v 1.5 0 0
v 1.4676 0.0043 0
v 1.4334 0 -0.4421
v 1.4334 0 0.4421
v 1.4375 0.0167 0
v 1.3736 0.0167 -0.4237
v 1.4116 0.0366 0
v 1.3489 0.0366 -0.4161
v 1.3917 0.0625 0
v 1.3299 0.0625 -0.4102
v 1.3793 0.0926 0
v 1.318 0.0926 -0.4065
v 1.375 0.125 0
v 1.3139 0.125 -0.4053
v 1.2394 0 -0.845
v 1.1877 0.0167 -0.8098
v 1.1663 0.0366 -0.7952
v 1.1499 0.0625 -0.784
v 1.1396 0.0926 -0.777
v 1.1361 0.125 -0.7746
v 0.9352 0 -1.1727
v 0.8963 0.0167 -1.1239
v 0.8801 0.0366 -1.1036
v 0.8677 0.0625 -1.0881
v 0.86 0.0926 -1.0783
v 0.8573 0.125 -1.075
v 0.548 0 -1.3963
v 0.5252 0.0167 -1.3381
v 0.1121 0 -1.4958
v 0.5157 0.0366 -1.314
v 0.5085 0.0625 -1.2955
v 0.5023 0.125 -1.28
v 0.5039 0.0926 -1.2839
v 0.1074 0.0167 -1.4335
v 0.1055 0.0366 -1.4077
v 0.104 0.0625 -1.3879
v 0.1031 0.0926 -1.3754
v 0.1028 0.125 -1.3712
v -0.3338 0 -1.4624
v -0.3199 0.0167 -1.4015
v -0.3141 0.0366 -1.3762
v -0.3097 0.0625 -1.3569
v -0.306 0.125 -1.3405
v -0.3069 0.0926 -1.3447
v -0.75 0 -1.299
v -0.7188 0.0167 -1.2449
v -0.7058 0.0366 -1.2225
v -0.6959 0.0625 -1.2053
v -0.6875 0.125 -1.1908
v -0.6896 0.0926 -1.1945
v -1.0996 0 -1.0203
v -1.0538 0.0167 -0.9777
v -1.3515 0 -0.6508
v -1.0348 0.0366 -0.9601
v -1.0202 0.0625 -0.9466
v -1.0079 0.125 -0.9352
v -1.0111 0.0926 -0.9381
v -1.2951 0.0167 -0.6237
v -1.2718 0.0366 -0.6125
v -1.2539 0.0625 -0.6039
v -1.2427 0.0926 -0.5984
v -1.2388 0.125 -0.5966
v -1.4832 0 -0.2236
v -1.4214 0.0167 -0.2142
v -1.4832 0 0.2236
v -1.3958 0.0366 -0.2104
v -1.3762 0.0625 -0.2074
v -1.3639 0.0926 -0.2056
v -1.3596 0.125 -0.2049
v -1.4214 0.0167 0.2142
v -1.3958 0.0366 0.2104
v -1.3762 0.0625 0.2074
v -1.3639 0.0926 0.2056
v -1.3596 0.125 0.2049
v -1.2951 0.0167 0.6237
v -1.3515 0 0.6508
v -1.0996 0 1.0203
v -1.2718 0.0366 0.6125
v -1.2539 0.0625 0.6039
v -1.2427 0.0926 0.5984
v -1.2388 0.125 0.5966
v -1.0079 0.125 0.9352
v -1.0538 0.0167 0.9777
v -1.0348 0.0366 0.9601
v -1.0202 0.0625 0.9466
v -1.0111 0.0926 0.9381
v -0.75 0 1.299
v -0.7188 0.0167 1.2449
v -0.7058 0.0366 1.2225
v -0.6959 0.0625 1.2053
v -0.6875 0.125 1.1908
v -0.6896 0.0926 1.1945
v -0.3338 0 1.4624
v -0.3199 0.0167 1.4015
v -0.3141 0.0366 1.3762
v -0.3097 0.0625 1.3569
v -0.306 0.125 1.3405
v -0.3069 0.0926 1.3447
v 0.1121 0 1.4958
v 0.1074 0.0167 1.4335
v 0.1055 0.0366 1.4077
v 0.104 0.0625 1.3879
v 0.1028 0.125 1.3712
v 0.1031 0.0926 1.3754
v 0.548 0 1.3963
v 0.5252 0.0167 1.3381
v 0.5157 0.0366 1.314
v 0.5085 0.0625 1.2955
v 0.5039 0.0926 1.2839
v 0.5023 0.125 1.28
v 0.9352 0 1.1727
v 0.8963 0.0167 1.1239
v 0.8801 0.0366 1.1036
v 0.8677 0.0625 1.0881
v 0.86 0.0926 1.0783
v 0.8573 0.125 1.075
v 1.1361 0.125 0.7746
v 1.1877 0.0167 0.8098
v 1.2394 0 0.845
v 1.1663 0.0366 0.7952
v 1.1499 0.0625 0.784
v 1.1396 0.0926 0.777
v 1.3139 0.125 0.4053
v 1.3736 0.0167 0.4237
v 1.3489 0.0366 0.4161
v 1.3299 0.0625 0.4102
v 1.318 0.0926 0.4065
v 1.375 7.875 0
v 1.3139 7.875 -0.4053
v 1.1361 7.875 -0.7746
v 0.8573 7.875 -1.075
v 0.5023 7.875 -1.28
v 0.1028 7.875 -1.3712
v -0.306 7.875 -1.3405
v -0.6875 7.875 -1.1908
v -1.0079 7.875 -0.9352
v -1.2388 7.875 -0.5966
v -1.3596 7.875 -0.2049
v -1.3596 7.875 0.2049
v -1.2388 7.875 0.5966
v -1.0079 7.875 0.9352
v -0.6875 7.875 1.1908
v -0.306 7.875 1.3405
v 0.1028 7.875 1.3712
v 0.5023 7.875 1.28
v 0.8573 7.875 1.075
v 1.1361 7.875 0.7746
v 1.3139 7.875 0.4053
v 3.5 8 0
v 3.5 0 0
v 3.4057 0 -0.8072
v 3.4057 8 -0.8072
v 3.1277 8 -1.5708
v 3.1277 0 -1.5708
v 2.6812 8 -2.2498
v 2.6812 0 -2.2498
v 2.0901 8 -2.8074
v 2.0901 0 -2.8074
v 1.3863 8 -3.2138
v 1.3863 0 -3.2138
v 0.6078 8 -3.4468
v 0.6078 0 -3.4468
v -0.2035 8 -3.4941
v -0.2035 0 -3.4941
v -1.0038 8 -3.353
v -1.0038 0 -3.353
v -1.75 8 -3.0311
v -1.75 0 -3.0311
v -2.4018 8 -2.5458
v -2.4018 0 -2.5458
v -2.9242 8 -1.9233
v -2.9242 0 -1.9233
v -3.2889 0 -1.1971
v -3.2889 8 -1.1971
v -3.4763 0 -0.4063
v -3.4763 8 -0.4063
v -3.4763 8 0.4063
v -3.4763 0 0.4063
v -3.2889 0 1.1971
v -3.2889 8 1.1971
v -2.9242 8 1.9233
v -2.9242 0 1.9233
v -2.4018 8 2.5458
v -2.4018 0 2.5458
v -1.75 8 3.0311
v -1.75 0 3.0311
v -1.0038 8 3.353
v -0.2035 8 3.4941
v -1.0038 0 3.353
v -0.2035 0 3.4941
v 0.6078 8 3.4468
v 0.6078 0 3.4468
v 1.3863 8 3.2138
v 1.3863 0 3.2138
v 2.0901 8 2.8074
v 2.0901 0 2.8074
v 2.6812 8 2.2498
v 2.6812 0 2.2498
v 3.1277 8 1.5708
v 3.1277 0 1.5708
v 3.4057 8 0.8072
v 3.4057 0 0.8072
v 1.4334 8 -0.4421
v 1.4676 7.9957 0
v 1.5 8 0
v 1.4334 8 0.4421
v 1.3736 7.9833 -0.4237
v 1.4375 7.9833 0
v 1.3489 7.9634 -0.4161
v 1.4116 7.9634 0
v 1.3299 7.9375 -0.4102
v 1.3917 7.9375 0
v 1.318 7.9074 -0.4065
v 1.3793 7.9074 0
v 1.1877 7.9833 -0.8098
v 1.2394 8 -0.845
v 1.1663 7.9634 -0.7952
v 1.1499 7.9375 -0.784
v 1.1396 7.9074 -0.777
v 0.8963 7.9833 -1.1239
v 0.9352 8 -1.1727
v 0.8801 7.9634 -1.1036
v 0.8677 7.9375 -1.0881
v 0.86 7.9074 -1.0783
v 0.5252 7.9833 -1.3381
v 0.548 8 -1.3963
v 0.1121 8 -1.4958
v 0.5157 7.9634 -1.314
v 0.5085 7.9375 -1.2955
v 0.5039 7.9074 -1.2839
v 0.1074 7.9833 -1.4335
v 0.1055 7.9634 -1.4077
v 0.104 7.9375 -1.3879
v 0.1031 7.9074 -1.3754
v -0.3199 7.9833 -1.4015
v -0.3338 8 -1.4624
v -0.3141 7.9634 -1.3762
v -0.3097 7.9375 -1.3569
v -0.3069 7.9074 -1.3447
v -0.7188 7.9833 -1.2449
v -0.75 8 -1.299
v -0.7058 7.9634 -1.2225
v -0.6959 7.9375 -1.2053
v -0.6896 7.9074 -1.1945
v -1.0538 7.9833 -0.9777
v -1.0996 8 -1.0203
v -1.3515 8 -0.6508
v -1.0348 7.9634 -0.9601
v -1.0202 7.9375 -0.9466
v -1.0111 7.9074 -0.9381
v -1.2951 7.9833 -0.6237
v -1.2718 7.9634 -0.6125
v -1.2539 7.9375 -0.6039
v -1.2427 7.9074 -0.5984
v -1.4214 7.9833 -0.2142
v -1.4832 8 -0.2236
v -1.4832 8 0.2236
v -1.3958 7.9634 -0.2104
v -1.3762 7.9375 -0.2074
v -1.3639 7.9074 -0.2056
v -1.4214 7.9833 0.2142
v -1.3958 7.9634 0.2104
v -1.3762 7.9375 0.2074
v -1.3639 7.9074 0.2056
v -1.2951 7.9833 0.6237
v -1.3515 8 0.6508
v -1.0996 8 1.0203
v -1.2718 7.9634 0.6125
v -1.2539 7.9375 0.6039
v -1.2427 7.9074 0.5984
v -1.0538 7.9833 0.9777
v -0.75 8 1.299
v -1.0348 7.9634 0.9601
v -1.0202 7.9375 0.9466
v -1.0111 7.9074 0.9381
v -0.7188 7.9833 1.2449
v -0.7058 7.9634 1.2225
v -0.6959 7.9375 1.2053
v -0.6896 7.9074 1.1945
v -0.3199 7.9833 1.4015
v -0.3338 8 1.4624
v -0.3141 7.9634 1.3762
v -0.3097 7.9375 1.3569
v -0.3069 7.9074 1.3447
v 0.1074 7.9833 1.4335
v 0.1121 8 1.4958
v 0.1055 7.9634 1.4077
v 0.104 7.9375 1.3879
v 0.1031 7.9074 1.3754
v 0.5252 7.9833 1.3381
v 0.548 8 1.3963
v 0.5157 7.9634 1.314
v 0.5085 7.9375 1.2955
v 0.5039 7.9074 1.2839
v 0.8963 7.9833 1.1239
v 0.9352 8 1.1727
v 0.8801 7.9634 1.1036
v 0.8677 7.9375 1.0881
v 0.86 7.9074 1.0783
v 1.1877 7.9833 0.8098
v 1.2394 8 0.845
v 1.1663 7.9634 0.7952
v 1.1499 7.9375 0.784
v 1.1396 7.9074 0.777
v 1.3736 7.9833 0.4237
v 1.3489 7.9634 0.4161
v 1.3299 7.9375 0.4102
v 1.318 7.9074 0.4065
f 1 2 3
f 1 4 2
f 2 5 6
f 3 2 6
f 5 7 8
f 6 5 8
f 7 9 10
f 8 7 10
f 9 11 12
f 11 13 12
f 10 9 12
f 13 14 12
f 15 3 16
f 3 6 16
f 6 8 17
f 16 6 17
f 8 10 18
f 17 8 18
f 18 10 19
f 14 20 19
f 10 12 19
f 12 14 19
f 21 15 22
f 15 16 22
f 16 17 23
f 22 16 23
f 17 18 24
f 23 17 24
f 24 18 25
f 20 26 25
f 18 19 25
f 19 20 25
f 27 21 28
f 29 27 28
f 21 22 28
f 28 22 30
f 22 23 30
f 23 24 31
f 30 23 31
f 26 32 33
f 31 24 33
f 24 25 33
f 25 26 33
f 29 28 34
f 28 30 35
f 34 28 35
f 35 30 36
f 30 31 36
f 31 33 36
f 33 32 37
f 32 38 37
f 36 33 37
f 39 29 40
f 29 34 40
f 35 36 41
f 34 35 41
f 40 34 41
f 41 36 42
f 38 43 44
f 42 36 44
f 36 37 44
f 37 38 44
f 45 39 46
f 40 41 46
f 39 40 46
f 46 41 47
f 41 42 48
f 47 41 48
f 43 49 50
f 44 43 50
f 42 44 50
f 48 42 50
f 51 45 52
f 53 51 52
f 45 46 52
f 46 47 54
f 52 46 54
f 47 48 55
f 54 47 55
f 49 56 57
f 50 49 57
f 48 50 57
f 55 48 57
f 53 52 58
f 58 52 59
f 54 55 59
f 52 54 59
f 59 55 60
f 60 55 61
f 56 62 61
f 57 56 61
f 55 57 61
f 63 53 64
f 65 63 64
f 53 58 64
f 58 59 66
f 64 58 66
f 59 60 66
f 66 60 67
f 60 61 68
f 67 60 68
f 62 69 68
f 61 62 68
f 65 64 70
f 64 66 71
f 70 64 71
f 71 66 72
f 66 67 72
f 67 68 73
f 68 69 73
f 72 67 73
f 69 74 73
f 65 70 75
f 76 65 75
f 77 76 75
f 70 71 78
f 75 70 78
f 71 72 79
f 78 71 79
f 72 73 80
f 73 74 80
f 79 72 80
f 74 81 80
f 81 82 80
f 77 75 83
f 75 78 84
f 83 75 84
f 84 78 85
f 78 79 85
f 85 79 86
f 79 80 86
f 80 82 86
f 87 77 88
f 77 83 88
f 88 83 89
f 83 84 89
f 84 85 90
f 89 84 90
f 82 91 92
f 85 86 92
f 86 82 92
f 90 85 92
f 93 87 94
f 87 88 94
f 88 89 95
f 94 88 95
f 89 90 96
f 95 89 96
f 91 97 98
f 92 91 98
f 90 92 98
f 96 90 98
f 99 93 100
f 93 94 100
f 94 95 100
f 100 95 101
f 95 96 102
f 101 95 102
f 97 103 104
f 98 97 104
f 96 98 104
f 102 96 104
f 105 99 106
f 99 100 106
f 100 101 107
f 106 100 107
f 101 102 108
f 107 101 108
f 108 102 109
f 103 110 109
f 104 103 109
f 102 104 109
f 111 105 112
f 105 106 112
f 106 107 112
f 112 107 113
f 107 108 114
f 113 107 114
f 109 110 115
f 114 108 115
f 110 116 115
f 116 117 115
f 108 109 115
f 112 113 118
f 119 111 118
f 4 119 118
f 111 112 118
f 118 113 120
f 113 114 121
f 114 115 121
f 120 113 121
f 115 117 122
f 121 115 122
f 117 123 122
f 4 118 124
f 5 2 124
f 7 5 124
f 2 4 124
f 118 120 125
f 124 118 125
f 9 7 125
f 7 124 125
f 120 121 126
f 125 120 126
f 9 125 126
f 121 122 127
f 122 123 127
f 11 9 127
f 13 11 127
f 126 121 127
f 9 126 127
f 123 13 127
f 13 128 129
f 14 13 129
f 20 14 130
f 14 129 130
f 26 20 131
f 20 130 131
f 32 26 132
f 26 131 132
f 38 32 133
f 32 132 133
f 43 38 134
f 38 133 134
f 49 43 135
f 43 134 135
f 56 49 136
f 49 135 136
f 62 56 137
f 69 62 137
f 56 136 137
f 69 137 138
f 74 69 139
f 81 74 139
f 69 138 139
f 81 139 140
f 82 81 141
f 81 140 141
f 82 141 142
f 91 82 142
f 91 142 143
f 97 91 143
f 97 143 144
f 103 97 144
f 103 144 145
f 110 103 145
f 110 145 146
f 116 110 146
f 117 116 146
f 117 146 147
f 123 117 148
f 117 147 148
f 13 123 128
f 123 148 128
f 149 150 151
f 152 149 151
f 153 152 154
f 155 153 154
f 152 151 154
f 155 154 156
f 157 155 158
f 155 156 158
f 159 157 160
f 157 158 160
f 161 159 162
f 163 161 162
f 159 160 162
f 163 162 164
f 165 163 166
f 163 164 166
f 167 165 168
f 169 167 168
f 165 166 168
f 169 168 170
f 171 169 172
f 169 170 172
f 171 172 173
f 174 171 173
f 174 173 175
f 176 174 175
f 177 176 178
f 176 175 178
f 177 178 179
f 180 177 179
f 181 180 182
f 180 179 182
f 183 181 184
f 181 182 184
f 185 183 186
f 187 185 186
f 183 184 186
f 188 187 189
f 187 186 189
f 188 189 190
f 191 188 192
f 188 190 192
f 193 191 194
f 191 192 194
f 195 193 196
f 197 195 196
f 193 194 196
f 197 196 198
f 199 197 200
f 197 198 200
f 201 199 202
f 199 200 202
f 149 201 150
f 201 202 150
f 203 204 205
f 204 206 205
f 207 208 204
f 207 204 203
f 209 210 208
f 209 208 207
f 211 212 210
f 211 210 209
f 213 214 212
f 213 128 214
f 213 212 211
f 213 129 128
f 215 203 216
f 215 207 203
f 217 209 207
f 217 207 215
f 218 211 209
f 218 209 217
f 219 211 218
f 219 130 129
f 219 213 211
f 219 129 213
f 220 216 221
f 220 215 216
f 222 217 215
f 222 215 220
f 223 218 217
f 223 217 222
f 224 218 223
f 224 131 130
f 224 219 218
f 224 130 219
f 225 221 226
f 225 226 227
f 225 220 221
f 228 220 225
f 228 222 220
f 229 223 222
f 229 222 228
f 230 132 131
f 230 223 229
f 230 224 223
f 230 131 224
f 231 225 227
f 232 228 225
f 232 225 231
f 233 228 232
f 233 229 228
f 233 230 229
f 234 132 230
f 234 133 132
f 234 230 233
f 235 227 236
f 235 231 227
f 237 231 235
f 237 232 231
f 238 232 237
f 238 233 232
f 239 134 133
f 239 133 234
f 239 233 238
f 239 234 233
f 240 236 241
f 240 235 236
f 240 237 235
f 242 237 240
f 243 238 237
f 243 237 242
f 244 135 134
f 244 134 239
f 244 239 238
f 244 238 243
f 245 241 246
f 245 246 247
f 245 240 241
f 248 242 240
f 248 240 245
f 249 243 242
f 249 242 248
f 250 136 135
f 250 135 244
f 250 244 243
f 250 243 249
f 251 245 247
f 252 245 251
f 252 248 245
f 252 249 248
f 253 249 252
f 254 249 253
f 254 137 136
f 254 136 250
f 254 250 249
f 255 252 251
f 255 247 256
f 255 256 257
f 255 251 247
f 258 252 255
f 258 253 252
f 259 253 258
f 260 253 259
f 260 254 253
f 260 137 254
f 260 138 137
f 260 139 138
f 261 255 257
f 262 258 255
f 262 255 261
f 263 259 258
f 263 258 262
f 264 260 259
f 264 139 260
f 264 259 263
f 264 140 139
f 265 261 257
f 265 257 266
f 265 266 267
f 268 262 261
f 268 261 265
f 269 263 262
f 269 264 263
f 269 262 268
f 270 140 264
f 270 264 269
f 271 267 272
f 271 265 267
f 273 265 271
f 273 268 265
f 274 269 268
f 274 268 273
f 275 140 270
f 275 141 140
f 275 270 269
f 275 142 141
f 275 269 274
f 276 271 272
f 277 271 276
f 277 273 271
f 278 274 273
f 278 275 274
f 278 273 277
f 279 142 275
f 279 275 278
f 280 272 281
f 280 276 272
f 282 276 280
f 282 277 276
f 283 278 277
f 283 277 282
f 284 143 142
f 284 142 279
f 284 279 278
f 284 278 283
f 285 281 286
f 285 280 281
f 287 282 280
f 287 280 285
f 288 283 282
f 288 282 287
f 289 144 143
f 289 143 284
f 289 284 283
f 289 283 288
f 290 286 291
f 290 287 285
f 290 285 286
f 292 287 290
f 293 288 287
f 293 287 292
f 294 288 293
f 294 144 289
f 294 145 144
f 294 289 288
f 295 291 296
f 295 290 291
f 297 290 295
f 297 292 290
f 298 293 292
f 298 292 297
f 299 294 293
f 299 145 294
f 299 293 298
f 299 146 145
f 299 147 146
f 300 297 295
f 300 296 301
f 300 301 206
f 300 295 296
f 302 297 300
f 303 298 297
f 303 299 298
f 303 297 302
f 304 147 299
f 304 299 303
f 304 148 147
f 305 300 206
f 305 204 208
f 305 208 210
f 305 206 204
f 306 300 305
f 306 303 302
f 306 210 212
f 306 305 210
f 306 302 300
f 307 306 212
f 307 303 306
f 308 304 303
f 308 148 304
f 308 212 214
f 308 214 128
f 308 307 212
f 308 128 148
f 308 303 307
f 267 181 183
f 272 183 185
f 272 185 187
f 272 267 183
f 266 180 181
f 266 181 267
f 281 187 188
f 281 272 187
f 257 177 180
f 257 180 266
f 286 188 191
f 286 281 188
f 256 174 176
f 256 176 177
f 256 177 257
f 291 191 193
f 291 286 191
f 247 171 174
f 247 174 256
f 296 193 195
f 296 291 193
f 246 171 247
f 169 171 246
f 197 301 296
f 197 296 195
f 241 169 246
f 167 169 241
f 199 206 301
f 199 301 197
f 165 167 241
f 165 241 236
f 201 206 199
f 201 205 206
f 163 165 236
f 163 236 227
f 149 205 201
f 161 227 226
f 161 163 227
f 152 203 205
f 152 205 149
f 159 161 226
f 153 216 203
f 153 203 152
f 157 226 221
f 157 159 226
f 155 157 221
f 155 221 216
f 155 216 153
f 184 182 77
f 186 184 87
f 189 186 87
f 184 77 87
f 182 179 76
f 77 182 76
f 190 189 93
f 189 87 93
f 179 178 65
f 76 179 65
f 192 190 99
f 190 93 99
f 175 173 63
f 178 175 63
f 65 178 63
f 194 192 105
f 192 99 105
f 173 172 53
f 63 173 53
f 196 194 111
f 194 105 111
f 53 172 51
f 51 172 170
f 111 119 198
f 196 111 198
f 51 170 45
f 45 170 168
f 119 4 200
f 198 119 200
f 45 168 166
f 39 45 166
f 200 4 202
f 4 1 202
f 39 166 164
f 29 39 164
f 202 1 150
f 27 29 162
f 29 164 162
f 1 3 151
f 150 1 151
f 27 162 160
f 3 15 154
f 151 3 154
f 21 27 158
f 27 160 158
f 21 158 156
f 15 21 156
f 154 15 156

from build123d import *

# Parameters (mm, degrees)
SKETCH1_R           = 3.5
BOSS_EXTRUDE1_DEPTH = 8
SKETCH2_R           = 1.375
CUT_EXTRUDE1_DEPTH  = 8
FILLET1_R           = 0.125


with BuildPart() as part:
    # Sketch1 → Boss-Extrude1 (new body)
    with BuildSketch(Plane(origin=(0, 0, 0), x_dir=(1, 0, 0), z_dir=(0, 1, 0))):
        Circle(SKETCH1_R)
    extrude(amount=BOSS_EXTRUDE1_DEPTH)

    # Sketch2 → Cut-Extrude1 (cut)
    with BuildSketch(Plane(origin=(0, 8, 0), x_dir=(1, 0, 0), z_dir=(0, 1, 0))):
        Circle(SKETCH2_R)
    extrude(amount=-CUT_EXTRUDE1_DEPTH, mode=Mode.SUBTRACT)

    # Fillet1
    fillet1_edges = [part.edges().sort_by_distance(p)[0] for p in [
        (-1.375, 0, 0),
        (-1.375, 8, 0),
    ]]
    fillet(fillet1_edges, radius=FILLET1_R)


solid = part.part
